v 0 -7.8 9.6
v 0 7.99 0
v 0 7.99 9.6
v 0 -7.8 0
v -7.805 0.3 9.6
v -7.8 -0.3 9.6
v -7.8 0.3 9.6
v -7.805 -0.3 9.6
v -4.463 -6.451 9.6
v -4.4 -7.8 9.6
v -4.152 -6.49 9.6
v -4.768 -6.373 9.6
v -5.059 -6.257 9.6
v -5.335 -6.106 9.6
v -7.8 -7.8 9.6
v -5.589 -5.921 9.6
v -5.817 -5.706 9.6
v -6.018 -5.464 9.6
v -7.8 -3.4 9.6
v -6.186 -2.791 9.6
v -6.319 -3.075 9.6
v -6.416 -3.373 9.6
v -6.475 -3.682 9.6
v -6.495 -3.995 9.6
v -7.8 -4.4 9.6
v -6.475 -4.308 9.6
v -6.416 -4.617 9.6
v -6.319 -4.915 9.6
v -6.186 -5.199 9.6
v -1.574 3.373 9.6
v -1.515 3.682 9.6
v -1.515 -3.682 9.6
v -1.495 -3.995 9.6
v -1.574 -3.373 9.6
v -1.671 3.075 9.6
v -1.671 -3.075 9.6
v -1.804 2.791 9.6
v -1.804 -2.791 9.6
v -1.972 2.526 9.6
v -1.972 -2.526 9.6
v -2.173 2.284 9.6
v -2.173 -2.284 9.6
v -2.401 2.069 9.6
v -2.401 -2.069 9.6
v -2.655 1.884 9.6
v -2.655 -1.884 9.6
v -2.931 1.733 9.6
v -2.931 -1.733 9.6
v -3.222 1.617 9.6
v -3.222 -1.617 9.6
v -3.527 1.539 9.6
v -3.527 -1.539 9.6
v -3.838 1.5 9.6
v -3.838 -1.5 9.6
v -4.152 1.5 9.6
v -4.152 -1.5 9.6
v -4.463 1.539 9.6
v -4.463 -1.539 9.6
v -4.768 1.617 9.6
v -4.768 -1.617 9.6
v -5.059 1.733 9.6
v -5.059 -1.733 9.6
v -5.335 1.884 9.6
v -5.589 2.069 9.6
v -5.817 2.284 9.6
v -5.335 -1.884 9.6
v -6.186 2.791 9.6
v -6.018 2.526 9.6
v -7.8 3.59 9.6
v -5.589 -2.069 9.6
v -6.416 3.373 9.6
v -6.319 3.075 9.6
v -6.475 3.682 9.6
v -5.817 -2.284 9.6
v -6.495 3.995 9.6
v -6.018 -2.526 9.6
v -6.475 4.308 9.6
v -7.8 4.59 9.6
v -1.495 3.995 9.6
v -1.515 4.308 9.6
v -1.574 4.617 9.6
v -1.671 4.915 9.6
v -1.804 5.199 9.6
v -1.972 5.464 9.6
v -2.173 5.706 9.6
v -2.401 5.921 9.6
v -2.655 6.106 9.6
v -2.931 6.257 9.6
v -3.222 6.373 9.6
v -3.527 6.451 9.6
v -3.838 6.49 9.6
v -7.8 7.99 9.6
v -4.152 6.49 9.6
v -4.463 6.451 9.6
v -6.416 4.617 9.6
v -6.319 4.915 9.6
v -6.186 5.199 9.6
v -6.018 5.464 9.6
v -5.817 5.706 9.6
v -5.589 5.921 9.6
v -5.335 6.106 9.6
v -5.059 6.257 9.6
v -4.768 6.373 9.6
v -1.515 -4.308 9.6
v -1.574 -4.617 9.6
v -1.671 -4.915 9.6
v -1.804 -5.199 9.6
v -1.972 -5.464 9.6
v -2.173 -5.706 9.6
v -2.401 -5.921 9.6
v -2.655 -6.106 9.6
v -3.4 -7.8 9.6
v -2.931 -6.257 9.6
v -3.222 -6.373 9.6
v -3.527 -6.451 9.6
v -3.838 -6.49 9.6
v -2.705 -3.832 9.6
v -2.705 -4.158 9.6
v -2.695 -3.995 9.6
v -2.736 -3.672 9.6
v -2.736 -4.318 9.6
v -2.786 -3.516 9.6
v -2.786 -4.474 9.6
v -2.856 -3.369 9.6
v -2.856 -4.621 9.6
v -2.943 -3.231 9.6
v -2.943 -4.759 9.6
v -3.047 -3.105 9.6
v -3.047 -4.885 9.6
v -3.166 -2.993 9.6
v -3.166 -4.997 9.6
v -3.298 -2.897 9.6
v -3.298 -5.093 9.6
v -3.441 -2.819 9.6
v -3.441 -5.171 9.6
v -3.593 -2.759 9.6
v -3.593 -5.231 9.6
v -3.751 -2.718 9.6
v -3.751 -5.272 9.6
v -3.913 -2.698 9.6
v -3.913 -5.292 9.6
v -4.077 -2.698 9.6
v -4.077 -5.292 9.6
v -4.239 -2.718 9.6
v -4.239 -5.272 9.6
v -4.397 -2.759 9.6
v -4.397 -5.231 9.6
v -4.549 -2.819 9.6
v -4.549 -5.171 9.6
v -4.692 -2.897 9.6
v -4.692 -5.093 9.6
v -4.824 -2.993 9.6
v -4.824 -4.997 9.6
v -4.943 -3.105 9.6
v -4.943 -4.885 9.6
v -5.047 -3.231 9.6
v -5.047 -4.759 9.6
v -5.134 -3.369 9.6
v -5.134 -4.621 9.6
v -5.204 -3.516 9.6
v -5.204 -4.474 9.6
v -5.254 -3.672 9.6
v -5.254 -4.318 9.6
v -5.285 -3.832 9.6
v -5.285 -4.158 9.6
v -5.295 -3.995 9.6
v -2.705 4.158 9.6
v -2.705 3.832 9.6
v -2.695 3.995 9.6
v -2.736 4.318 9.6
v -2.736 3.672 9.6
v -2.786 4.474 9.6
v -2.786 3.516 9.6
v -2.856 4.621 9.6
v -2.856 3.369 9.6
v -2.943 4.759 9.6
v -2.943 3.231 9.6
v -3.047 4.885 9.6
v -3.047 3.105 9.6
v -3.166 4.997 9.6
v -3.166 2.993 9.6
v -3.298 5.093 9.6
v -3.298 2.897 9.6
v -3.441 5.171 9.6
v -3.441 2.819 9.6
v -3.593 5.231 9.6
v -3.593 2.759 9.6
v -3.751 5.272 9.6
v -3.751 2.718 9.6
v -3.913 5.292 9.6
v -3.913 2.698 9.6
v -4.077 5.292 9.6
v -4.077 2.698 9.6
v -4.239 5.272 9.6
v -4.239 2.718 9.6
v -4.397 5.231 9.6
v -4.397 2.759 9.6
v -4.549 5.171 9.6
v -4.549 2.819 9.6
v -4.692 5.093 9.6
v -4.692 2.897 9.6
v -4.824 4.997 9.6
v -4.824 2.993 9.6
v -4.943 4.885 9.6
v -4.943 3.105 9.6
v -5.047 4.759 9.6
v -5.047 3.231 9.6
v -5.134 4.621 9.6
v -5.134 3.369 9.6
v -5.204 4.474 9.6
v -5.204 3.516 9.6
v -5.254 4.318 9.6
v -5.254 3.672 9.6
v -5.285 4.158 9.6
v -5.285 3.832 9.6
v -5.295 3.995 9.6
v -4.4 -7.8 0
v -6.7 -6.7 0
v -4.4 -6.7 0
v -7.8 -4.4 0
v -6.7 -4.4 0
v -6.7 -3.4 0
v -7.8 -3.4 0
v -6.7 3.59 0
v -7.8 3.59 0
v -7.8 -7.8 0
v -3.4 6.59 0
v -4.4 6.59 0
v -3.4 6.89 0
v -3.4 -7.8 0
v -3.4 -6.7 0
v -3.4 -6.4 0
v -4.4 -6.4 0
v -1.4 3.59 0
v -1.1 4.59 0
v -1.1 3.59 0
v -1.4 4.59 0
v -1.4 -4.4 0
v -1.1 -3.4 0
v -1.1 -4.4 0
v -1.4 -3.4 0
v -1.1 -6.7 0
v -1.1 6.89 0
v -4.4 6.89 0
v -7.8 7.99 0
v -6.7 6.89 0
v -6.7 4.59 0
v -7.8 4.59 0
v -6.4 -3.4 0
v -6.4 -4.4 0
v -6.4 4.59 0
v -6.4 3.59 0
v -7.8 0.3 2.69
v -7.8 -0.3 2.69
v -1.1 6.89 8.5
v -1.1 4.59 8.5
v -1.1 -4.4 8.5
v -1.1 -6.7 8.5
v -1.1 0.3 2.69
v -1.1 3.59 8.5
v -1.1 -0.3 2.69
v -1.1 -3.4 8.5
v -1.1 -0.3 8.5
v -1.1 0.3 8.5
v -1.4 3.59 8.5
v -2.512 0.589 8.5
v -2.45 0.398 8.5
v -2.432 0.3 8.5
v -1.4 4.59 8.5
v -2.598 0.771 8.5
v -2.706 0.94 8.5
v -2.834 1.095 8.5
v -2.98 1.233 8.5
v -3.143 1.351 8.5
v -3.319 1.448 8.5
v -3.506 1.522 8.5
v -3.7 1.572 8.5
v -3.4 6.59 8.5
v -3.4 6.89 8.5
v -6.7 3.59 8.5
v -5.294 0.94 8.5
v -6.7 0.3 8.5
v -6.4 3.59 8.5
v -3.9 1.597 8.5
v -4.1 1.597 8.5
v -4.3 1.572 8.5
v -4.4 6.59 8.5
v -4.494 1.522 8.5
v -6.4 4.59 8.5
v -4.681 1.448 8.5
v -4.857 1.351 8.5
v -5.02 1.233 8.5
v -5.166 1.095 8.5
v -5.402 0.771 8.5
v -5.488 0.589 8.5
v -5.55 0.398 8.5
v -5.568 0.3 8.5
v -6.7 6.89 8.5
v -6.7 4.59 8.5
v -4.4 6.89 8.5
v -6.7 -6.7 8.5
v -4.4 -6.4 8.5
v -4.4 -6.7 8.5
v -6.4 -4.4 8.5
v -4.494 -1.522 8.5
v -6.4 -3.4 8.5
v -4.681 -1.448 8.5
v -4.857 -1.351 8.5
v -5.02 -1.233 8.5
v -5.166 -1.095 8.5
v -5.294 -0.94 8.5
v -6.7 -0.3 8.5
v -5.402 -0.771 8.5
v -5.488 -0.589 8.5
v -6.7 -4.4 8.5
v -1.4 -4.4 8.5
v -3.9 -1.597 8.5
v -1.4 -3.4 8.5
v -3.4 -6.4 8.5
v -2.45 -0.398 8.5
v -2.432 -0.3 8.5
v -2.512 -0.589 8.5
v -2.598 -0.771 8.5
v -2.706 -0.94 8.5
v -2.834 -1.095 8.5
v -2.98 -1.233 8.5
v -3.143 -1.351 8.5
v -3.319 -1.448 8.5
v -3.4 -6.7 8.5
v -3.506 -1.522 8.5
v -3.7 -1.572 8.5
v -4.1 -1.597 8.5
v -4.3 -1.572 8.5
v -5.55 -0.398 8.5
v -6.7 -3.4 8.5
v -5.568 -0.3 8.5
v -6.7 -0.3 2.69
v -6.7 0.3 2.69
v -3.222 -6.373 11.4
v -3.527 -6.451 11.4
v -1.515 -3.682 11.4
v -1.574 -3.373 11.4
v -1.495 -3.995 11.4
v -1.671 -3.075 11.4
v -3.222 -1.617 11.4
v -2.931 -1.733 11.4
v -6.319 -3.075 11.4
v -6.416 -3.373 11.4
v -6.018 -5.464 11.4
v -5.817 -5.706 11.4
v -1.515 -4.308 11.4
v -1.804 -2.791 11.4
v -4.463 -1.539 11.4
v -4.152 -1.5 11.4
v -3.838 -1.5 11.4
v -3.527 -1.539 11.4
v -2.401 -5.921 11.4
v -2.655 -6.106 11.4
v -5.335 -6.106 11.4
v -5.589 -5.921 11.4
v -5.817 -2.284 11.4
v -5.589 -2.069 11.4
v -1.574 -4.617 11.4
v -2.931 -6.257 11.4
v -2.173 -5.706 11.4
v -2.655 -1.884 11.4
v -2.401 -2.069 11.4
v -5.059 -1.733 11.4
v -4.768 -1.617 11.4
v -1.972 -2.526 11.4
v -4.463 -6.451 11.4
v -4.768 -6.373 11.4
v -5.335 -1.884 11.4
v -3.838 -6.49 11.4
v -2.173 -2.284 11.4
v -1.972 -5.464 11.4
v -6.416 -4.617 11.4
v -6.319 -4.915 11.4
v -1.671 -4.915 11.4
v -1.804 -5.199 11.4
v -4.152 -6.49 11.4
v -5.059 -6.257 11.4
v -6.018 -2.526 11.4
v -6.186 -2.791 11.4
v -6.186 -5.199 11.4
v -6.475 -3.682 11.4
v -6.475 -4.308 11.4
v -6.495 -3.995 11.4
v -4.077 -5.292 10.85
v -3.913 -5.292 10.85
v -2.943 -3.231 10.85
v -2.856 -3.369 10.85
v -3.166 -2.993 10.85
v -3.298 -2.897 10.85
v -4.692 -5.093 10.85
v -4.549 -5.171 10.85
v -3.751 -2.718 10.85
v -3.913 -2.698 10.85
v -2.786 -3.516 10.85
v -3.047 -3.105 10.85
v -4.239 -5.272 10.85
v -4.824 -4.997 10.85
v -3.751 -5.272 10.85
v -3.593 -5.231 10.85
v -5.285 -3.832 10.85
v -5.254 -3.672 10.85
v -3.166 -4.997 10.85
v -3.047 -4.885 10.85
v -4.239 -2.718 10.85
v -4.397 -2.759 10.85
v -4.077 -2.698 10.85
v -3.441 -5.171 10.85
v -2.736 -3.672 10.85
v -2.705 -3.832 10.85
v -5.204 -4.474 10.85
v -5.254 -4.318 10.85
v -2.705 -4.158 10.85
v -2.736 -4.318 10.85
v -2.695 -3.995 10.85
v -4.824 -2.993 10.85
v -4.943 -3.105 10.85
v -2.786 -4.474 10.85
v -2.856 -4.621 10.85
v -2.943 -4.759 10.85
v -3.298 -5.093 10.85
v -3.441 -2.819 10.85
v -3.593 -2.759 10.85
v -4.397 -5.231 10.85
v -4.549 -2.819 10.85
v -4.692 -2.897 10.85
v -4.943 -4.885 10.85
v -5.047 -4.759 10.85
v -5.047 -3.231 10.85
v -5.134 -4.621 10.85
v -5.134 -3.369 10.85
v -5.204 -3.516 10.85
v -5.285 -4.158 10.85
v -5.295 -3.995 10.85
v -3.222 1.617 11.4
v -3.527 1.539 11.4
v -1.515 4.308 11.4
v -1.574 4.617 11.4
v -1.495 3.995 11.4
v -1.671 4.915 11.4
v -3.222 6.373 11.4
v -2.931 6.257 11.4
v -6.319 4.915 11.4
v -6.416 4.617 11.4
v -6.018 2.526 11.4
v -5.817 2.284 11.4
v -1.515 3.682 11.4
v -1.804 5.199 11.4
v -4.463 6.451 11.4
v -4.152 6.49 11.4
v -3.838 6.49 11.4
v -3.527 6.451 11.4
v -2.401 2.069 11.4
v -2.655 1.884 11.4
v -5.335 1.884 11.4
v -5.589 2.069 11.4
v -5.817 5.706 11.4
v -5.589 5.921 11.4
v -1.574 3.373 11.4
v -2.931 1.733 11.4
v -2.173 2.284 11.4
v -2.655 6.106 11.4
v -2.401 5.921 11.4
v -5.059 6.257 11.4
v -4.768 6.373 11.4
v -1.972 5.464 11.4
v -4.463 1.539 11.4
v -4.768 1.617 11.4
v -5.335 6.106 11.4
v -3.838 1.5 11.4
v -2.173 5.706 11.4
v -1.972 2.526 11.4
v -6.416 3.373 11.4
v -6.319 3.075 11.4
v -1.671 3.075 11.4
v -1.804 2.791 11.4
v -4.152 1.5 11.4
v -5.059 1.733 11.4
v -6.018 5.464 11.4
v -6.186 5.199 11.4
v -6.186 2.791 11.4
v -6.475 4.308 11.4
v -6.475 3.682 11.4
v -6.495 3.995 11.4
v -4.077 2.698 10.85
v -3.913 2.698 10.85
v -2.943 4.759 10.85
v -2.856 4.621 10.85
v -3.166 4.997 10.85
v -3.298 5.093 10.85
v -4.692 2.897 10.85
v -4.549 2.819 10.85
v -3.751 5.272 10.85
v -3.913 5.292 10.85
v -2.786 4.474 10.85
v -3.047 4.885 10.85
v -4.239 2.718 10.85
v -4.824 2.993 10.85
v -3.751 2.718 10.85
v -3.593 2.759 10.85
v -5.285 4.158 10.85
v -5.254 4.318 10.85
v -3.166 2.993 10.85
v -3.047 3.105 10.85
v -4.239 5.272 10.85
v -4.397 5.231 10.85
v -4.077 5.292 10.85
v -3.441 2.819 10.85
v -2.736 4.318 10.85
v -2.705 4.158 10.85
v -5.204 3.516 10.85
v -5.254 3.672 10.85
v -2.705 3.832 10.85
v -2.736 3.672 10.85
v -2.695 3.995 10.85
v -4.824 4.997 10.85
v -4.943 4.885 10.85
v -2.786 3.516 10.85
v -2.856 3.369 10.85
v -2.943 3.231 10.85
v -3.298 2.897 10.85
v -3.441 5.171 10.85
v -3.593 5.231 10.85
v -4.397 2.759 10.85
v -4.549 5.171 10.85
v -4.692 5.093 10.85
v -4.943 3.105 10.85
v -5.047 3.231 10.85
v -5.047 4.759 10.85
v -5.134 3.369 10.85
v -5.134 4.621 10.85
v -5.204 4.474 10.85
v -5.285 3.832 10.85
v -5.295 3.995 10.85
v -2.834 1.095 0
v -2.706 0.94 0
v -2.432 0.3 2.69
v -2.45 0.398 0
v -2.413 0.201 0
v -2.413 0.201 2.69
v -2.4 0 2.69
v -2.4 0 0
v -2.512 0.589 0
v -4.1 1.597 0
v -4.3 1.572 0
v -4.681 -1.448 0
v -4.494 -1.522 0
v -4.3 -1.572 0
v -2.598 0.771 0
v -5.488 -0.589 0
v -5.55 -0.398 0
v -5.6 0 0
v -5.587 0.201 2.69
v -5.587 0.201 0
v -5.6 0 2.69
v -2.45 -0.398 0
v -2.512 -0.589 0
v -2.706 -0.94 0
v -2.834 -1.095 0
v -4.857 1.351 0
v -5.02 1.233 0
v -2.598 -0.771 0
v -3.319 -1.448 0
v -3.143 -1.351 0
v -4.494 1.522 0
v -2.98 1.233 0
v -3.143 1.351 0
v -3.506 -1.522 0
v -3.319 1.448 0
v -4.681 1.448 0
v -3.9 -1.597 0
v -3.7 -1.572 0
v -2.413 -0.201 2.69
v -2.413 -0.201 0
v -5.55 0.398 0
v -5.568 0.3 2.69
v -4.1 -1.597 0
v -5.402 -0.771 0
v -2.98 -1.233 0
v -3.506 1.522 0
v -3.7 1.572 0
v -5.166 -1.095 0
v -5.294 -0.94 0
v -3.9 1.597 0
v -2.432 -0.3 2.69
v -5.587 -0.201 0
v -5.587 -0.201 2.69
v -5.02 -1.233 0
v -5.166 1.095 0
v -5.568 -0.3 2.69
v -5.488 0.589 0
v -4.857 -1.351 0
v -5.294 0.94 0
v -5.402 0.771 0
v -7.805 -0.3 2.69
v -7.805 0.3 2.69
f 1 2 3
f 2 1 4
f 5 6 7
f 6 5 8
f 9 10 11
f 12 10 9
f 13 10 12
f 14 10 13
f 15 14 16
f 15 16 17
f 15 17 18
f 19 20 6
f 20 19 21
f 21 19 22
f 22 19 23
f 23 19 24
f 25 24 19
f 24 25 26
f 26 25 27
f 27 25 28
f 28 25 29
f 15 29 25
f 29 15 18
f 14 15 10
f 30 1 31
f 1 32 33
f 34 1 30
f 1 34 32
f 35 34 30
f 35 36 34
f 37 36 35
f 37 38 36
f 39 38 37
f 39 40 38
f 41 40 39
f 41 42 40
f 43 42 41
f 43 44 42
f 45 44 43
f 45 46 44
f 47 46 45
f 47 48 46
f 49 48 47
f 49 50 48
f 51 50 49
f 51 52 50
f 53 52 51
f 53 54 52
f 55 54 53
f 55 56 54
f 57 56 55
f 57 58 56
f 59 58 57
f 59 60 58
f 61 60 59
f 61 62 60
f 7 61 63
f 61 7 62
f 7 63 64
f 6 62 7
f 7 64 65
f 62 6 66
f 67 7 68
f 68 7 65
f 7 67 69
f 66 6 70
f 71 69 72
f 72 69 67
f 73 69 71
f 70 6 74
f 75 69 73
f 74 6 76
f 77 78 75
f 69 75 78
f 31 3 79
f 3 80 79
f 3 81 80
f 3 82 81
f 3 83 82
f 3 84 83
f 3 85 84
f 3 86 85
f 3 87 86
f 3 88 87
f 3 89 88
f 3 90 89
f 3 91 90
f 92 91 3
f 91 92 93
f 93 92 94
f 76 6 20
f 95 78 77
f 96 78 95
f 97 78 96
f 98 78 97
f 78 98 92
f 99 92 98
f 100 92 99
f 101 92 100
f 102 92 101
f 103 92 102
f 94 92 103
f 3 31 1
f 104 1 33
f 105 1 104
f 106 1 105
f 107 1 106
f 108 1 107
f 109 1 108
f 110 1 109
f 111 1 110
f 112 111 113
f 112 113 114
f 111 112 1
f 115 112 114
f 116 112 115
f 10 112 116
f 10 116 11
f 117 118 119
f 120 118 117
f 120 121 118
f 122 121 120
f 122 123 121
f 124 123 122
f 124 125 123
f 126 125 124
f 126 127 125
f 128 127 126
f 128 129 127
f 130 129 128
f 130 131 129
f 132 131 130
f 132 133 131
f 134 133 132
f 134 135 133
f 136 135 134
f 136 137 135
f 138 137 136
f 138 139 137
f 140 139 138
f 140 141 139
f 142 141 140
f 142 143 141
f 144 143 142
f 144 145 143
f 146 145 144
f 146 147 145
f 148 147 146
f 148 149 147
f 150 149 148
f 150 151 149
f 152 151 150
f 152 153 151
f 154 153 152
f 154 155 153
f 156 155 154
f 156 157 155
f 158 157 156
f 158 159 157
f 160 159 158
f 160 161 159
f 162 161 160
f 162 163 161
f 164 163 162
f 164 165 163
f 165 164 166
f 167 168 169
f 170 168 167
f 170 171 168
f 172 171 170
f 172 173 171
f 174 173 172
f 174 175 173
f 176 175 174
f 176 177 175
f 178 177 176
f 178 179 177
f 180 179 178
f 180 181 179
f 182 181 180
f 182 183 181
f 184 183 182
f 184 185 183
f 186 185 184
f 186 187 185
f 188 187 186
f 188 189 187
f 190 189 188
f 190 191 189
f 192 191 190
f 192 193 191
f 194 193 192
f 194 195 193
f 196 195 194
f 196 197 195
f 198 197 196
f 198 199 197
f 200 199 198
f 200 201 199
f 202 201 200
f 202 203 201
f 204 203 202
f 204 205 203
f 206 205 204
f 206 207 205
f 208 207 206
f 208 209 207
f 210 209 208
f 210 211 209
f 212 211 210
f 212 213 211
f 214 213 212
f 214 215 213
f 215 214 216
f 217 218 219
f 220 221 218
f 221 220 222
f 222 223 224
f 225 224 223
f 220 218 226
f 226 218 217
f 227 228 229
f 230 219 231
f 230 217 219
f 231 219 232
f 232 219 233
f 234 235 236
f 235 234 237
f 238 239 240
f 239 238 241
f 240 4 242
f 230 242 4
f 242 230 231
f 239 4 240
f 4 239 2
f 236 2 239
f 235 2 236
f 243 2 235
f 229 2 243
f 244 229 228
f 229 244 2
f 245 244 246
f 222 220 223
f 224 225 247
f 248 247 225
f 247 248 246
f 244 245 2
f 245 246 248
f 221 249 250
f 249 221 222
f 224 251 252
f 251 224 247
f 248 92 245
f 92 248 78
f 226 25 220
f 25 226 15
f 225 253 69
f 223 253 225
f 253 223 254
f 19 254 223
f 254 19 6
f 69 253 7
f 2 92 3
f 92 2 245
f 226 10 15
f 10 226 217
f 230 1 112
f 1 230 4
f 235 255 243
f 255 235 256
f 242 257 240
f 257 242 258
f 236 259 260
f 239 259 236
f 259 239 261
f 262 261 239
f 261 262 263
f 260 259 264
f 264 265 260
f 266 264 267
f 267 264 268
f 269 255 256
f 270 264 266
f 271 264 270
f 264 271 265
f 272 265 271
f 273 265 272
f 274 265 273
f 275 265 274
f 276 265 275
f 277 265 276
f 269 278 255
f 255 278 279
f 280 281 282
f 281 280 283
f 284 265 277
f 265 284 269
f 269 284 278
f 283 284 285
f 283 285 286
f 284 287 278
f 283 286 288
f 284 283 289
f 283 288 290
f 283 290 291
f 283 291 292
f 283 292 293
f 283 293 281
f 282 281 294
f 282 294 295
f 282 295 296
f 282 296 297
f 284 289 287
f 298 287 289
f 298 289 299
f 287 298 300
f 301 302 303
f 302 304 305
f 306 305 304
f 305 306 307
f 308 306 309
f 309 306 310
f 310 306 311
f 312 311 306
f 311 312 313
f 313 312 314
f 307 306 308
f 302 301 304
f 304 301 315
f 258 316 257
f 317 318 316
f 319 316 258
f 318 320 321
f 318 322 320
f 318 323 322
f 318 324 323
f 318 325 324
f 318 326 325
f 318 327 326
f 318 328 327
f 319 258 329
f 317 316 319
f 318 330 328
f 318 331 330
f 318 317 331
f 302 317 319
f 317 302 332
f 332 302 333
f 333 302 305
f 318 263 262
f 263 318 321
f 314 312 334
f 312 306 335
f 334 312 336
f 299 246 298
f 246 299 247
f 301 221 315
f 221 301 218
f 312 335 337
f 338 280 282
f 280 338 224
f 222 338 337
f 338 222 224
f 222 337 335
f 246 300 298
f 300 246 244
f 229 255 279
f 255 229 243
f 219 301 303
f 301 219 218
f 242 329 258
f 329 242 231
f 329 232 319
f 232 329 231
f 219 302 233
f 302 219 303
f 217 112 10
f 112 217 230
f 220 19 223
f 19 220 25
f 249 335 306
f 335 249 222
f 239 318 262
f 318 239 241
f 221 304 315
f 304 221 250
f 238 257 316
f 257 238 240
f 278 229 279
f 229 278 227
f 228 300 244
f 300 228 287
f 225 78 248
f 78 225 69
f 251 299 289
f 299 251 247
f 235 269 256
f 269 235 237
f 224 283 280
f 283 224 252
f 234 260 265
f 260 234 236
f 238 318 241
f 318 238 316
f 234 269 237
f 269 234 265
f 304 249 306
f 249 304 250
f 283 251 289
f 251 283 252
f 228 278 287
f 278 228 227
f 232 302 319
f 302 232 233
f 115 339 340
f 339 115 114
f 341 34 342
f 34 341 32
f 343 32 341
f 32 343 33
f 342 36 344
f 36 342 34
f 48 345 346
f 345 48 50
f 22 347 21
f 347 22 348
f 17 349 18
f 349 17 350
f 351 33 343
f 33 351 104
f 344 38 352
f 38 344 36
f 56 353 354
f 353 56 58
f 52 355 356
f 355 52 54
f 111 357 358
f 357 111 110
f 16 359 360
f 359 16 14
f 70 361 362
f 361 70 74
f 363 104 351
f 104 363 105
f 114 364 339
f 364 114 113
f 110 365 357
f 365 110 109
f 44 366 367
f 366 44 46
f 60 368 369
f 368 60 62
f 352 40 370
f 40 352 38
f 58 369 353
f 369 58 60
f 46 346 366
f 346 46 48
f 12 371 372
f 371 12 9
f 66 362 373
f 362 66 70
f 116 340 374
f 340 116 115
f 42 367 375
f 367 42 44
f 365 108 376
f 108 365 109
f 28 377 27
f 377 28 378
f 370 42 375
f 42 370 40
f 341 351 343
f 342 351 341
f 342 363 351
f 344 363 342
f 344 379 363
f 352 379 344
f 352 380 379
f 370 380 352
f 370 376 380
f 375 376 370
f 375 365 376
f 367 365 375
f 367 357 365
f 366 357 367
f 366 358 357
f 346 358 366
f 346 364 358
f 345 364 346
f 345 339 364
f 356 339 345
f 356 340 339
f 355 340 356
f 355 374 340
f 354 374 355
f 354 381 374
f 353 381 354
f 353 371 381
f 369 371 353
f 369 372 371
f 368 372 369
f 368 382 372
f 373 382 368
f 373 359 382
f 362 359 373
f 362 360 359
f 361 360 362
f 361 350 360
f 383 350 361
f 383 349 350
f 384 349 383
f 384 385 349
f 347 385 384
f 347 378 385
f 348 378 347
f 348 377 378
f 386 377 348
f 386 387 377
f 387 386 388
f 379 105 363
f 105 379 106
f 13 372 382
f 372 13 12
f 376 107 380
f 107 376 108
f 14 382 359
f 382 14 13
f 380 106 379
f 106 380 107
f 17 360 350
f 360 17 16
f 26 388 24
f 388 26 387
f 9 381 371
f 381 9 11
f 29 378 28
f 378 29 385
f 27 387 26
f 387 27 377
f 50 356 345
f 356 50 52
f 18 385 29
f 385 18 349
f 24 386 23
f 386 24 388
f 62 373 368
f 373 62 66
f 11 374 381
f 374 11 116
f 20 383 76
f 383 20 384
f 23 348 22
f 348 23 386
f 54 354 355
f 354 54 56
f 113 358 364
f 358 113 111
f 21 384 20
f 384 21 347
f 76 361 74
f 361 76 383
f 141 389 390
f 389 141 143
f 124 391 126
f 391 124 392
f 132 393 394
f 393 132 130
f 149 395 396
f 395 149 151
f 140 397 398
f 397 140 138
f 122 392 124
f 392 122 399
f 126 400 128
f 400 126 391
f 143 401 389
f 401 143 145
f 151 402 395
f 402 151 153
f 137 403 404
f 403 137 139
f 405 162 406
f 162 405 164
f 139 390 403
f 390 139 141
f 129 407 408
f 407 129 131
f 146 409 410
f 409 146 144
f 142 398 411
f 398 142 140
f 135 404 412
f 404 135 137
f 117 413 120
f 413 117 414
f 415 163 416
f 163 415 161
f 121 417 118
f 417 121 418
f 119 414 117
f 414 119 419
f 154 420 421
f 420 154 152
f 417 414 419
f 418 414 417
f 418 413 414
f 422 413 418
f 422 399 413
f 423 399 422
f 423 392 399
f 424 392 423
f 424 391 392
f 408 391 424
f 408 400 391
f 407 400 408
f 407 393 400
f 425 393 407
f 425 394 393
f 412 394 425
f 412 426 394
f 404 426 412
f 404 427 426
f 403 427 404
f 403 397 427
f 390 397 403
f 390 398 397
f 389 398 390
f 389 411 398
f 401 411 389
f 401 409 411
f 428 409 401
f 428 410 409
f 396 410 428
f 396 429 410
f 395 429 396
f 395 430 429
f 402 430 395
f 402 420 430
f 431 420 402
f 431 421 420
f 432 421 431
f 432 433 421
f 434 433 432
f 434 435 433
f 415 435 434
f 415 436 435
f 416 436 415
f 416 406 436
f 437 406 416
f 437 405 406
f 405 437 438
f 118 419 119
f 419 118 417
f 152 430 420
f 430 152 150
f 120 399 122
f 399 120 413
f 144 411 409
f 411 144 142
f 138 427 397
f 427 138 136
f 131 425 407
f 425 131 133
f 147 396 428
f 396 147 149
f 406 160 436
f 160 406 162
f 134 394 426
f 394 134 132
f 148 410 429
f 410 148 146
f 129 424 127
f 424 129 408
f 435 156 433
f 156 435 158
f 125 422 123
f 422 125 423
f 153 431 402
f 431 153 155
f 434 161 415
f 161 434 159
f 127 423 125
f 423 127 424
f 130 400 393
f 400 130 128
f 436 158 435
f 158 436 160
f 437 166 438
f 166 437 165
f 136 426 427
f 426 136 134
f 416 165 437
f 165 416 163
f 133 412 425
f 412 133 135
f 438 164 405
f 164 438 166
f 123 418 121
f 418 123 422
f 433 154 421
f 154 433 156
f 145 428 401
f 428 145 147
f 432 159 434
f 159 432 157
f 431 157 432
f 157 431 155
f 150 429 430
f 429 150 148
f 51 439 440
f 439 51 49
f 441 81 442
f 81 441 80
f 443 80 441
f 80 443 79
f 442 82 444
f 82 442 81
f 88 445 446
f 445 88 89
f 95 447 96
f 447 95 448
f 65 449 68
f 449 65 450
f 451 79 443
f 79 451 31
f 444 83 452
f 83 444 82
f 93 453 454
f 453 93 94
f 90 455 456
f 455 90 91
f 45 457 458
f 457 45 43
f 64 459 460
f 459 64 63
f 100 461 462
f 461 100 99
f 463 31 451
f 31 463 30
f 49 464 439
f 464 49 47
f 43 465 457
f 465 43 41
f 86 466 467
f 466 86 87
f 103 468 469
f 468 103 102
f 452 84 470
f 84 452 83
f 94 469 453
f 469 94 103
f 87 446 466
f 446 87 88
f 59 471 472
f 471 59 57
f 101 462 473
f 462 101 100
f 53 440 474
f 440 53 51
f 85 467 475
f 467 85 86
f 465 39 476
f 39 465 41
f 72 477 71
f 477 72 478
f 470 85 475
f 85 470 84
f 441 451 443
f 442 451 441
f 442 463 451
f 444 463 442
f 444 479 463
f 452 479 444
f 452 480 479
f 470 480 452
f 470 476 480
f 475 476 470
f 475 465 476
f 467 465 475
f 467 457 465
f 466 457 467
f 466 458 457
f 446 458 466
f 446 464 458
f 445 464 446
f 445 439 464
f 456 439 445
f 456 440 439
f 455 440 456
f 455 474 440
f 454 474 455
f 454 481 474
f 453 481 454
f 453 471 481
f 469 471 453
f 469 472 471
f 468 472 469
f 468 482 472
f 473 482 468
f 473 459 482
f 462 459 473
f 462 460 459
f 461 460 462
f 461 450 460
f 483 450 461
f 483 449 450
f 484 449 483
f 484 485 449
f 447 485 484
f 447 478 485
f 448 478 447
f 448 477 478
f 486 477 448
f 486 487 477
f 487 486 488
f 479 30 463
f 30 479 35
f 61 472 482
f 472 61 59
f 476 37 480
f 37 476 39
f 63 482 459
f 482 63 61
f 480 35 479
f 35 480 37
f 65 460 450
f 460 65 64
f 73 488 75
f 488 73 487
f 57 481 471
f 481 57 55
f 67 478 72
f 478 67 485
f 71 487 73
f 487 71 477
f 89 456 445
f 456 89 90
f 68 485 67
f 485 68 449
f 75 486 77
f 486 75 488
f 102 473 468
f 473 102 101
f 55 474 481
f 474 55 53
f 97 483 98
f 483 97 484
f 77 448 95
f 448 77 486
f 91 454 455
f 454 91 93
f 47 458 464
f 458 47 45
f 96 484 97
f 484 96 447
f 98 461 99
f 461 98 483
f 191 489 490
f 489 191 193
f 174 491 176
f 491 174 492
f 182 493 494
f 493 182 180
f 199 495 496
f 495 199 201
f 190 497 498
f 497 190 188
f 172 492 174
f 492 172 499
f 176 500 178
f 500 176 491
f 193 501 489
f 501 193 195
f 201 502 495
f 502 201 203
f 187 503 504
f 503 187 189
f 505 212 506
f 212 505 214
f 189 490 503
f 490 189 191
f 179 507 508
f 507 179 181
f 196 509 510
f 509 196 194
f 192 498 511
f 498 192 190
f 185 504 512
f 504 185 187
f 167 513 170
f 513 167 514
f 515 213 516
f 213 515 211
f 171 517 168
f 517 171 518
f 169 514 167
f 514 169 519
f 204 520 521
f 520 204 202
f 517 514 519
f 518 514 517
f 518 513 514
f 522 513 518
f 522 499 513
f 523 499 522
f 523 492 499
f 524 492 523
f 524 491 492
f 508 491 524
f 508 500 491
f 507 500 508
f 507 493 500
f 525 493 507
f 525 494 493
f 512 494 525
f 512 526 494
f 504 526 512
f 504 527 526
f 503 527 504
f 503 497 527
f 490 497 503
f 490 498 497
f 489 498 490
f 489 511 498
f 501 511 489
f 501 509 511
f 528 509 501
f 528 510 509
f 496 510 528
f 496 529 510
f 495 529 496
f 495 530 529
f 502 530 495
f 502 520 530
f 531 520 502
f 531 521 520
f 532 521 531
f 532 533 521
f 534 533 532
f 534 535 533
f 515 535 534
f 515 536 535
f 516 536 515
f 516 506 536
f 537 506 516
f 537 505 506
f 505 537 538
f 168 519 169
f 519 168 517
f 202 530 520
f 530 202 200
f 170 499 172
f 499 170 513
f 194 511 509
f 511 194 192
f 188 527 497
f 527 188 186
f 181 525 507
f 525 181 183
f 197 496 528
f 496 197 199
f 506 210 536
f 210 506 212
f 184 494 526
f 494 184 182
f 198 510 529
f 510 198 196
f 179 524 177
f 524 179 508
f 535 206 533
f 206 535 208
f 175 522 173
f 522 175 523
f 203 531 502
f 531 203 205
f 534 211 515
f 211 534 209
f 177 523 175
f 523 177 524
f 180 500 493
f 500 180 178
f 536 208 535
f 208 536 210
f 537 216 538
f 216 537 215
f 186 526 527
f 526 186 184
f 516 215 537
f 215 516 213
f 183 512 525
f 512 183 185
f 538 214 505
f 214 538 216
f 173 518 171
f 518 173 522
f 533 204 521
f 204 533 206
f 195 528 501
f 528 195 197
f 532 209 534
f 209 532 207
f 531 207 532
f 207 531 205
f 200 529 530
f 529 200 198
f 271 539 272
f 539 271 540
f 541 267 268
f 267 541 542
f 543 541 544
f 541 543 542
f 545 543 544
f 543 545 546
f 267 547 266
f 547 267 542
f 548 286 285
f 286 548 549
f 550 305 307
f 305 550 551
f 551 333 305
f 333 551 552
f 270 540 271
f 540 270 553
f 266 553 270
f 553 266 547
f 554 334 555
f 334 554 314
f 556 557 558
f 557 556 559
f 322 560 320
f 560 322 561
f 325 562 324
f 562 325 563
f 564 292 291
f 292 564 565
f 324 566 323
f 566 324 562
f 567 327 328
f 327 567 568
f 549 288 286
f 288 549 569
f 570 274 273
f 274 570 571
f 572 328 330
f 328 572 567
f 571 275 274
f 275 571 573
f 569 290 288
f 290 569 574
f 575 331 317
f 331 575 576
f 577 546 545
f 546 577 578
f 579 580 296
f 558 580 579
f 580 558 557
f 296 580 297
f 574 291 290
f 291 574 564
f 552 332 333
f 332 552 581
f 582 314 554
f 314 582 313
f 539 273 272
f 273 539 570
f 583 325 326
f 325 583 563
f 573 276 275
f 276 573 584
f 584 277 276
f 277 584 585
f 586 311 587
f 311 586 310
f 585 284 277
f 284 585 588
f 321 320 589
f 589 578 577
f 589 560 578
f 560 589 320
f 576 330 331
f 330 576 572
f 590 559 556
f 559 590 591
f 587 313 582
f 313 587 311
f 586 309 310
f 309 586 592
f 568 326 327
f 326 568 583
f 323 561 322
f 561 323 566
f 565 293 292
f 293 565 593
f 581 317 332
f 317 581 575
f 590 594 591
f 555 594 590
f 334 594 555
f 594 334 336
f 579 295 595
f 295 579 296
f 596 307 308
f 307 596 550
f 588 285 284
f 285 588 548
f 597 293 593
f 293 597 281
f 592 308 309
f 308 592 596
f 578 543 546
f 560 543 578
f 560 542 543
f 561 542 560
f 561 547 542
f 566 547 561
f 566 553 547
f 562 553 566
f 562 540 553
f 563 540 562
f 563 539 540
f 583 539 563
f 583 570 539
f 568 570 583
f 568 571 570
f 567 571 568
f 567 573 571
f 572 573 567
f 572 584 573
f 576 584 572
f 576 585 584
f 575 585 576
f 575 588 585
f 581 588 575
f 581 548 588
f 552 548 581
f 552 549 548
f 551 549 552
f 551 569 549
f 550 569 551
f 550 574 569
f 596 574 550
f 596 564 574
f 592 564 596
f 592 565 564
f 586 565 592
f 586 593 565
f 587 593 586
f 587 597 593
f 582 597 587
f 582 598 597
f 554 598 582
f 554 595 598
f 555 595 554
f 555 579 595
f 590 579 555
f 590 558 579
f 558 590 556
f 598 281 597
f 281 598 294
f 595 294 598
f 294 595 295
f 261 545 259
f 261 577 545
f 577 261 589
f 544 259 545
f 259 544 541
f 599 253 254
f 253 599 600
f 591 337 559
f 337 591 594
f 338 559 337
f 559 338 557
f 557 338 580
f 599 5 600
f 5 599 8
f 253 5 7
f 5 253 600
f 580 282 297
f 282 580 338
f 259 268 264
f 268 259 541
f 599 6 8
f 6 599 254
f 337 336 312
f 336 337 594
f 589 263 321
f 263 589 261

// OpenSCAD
//!OpenSCAD

// Use 0.4 shell thickness or supports may not print
// change lengthDots and widthDots to the dimensions you need
// intended Nozzle Diameter adjusts the wall thickness for 3d printing
// thinPlate = "yes" for plate "no" for regular block height
lengthDots = 2;
widthDots = 1;
intendedNozzleDiameter = 0.4;
thinPlate = "no";
// Constants
singleWidth = 7.8;
standardHeight = (thinPlate== "yes" ? 3.18 : 9.6);
perBlockWidthAdjustment = 0.19;
wallThickness = 1.1;
dotHeight = 1.8;
dotRadius = 2.5;
wallSupportThickness = 0.6;
undersideSingleWidthSupportPostRadius = 1.6;//under 1xN blocks
union(){
  union(){
    // Brick Shape
    difference() {
        //outer brick shape
      translate([(-singleWidth), (-singleWidth), 0]){
        cube([(singleWidth * widthDots + (widthDots - 1) * perBlockWidthAdjustment), (singleWidth * lengthDots + (lengthDots - 1) * perBlockWidthAdjustment), standardHeight], center=false);
      }
        //inside subtracted to create walls
      translate([(-(singleWidth - wallThickness)), (-(singleWidth - wallThickness)), 0]){
        cube([((singleWidth * widthDots + (widthDots - 1) * perBlockWidthAdjustment) - wallThickness * 2), ((singleWidth * lengthDots + (lengthDots - 1) * perBlockWidthAdjustment) - wallThickness * 2), (standardHeight - wallThickness)], center=false);
      }
    }
    // create the small protuberances inside the block that tighten then blocks grip on other blocks
    difference() {
      for (k = [-(singleWidth * 0.5) : abs(singleWidth + perBlockWidthAdjustment) : singleWidth * (widthDots - 1) + (widthDots - 1) * perBlockWidthAdjustment]) {
        for (i = [-(singleWidth * 0.5) : abs(singleWidth + perBlockWidthAdjustment) : singleWidth * (lengthDots - 1) + (lengthDots - 1) * perBlockWidthAdjustment]) {
          translate([k, i, 0]){
            union(){
              translate([0, 0, (standardHeight / 2)]){
                cube([(lengthDots <= widthDots ? singleWidth : 1), (lengthDots > widthDots ? singleWidth : 1), standardHeight], center=true);
              }
              translate([0, 0, (standardHeight / 2)]){
                cube([(lengthDots > widthDots ? singleWidth : 1), (lengthDots <= widthDots ? singleWidth : 1), standardHeight], center=true);
              }
            }
          }
        }

      }

      for (k = [0 : abs(singleWidth + perBlockWidthAdjustment) : singleWidth  + (widthDots - 1) * perBlockWidthAdjustment]) {
        for (i = [0 : abs(singleWidth + perBlockWidthAdjustment) : singleWidth  + (lengthDots - 1) * perBlockWidthAdjustment]) {
          translate([(-(singleWidth - wallThickness) + wallSupportThickness / 2), (-(singleWidth - wallThickness) + wallSupportThickness / 2), 0]){
            cube([(((singleWidth * widthDots + (widthDots - 1) * perBlockWidthAdjustment) - wallThickness * 2) - wallSupportThickness), (((singleWidth * lengthDots + (lengthDots - 1) * perBlockWidthAdjustment) - wallThickness * 2) - wallSupportThickness), (standardHeight - wallThickness)], center=false);
          }
        }

      }

    }
  }
  // Dots on tops
  for (m = [-((singleWidth + perBlockWidthAdjustment) / 2) : abs(-singleWidth - perBlockWidthAdjustment) : singleWidth * (widthDots - 1) + (widthDots - 1) * perBlockWidthAdjustment]) {
    for (j = [-((singleWidth + perBlockWidthAdjustment) / 2) : abs(singleWidth + perBlockWidthAdjustment) : singleWidth * (lengthDots - 1) + (lengthDots - 1) * perBlockWidthAdjustment]) {
      translate([m, j, (standardHeight - wallThickness / 2)]){
        difference() {
          cylinder(r1=dotRadius, r2=dotRadius, h=(dotHeight + wallThickness / 2), center=false, $fn=50);

          cylinder(r1=(dotRadius - intendedNozzleDiameter * 3), r2=(dotRadius - intendedNozzleDiameter * 3), h=dotHeight, center=false, $fn=50);
        }
      }
    }

  }

  // Underside supports
  if (widthDots > 1 && lengthDots > 1) {
    difference() {
        // create the basic shape of the cylinder and it's connection points
      for (k = [0 : abs(singleWidth + perBlockWidthAdjustment) : singleWidth * (widthDots - 2) + (widthDots - 1) * perBlockWidthAdjustment]) {
        for (i = [0 : abs(singleWidth + perBlockWidthAdjustment) : singleWidth * (lengthDots - 2) + (lengthDots - 1) * perBlockWidthAdjustment]) {
          translate([k, i, 0]){
            union(){
              cylinder(r1=((round((3.22 - dotRadius) / intendedNozzleDiameter) * intendedNozzleDiameter) + dotRadius), r2=((round((3.22 - dotRadius) / intendedNozzleDiameter) * intendedNozzleDiameter) + dotRadius), h=(standardHeight - wallThickness / 2), center=false, $fn=50);
              translate([0, 0, (standardHeight - ((standardHeight / 2 - wallThickness / 4) - 1.07))]){
                cube([(lengthDots >= widthDots ? singleWidth * 2 : wallSupportThickness), (lengthDots < widthDots ? singleWidth * 2 : wallSupportThickness), ((standardHeight - wallThickness / 2) - 2.14)], center=true);
              }
            }
          }
        }

      }
        // take away the center of each support cylinder
      for (k = [0 : abs(singleWidth + perBlockWidthAdjustment) : singleWidth * (widthDots - 2) + (widthDots - 1) * perBlockWidthAdjustment]) {
        for (i = [0 : abs(singleWidth + perBlockWidthAdjustment) : singleWidth * (lengthDots - 2) + (lengthDots - 1) * perBlockWidthAdjustment]) {
          translate([k, i, 0]){
            cylinder(r1=dotRadius, r2=dotRadius, h=(standardHeight - wallThickness / 2), center=false, $fn=50);
          }
        }

      }

    }
    //if either direction is a single dot the underside changes
  } else if (widthDots > 1 && lengthDots == 1 || widthDots == 1 && lengthDots > 1) {
    for (i = [0 : abs(singleWidth + perBlockWidthAdjustment) : lengthDots > widthDots ? singleWidth * (lengthDots - 2) + (lengthDots - 1) * perBlockWidthAdjustment : singleWidth * (widthDots - 2) + (widthDots - 1) * perBlockWidthAdjustment]) {
      translate([(lengthDots > widthDots ? -4 : i), (lengthDots > widthDots ? i : -4), 0]){
        union(){
            //underside Single Width Support Post
          cylinder(r1=undersideSingleWidthSupportPostRadius, r2=undersideSingleWidthSupportPostRadius, h=(standardHeight - wallThickness / 2), center=false, $fn = 50);
          translate([0, 0, (standardHeight - ((standardHeight / 2 - wallThickness / 4) - 1.07))]){
            cube([(lengthDots > widthDots ? singleWidth - perBlockWidthAdjustment : wallSupportThickness), (widthDots > lengthDots ? singleWidth - perBlockWidthAdjustment : wallSupportThickness), ((standardHeight - wallThickness / 2) - 2.14)], center=true);
          }
        }
      }
    }
    // if the block is 1x1 there is no underside
  } else if (widthDots == 1 && lengthDots == 1) {
    difference() {
      cylinder(r1=1.5, r2=1.5, h=(standardHeight - wallThickness / 2), center=false);

      cylinder(r1=1.5, r2=1.5, h=(standardHeight - wallThickness / 2), center=false);
    }
  }

}
